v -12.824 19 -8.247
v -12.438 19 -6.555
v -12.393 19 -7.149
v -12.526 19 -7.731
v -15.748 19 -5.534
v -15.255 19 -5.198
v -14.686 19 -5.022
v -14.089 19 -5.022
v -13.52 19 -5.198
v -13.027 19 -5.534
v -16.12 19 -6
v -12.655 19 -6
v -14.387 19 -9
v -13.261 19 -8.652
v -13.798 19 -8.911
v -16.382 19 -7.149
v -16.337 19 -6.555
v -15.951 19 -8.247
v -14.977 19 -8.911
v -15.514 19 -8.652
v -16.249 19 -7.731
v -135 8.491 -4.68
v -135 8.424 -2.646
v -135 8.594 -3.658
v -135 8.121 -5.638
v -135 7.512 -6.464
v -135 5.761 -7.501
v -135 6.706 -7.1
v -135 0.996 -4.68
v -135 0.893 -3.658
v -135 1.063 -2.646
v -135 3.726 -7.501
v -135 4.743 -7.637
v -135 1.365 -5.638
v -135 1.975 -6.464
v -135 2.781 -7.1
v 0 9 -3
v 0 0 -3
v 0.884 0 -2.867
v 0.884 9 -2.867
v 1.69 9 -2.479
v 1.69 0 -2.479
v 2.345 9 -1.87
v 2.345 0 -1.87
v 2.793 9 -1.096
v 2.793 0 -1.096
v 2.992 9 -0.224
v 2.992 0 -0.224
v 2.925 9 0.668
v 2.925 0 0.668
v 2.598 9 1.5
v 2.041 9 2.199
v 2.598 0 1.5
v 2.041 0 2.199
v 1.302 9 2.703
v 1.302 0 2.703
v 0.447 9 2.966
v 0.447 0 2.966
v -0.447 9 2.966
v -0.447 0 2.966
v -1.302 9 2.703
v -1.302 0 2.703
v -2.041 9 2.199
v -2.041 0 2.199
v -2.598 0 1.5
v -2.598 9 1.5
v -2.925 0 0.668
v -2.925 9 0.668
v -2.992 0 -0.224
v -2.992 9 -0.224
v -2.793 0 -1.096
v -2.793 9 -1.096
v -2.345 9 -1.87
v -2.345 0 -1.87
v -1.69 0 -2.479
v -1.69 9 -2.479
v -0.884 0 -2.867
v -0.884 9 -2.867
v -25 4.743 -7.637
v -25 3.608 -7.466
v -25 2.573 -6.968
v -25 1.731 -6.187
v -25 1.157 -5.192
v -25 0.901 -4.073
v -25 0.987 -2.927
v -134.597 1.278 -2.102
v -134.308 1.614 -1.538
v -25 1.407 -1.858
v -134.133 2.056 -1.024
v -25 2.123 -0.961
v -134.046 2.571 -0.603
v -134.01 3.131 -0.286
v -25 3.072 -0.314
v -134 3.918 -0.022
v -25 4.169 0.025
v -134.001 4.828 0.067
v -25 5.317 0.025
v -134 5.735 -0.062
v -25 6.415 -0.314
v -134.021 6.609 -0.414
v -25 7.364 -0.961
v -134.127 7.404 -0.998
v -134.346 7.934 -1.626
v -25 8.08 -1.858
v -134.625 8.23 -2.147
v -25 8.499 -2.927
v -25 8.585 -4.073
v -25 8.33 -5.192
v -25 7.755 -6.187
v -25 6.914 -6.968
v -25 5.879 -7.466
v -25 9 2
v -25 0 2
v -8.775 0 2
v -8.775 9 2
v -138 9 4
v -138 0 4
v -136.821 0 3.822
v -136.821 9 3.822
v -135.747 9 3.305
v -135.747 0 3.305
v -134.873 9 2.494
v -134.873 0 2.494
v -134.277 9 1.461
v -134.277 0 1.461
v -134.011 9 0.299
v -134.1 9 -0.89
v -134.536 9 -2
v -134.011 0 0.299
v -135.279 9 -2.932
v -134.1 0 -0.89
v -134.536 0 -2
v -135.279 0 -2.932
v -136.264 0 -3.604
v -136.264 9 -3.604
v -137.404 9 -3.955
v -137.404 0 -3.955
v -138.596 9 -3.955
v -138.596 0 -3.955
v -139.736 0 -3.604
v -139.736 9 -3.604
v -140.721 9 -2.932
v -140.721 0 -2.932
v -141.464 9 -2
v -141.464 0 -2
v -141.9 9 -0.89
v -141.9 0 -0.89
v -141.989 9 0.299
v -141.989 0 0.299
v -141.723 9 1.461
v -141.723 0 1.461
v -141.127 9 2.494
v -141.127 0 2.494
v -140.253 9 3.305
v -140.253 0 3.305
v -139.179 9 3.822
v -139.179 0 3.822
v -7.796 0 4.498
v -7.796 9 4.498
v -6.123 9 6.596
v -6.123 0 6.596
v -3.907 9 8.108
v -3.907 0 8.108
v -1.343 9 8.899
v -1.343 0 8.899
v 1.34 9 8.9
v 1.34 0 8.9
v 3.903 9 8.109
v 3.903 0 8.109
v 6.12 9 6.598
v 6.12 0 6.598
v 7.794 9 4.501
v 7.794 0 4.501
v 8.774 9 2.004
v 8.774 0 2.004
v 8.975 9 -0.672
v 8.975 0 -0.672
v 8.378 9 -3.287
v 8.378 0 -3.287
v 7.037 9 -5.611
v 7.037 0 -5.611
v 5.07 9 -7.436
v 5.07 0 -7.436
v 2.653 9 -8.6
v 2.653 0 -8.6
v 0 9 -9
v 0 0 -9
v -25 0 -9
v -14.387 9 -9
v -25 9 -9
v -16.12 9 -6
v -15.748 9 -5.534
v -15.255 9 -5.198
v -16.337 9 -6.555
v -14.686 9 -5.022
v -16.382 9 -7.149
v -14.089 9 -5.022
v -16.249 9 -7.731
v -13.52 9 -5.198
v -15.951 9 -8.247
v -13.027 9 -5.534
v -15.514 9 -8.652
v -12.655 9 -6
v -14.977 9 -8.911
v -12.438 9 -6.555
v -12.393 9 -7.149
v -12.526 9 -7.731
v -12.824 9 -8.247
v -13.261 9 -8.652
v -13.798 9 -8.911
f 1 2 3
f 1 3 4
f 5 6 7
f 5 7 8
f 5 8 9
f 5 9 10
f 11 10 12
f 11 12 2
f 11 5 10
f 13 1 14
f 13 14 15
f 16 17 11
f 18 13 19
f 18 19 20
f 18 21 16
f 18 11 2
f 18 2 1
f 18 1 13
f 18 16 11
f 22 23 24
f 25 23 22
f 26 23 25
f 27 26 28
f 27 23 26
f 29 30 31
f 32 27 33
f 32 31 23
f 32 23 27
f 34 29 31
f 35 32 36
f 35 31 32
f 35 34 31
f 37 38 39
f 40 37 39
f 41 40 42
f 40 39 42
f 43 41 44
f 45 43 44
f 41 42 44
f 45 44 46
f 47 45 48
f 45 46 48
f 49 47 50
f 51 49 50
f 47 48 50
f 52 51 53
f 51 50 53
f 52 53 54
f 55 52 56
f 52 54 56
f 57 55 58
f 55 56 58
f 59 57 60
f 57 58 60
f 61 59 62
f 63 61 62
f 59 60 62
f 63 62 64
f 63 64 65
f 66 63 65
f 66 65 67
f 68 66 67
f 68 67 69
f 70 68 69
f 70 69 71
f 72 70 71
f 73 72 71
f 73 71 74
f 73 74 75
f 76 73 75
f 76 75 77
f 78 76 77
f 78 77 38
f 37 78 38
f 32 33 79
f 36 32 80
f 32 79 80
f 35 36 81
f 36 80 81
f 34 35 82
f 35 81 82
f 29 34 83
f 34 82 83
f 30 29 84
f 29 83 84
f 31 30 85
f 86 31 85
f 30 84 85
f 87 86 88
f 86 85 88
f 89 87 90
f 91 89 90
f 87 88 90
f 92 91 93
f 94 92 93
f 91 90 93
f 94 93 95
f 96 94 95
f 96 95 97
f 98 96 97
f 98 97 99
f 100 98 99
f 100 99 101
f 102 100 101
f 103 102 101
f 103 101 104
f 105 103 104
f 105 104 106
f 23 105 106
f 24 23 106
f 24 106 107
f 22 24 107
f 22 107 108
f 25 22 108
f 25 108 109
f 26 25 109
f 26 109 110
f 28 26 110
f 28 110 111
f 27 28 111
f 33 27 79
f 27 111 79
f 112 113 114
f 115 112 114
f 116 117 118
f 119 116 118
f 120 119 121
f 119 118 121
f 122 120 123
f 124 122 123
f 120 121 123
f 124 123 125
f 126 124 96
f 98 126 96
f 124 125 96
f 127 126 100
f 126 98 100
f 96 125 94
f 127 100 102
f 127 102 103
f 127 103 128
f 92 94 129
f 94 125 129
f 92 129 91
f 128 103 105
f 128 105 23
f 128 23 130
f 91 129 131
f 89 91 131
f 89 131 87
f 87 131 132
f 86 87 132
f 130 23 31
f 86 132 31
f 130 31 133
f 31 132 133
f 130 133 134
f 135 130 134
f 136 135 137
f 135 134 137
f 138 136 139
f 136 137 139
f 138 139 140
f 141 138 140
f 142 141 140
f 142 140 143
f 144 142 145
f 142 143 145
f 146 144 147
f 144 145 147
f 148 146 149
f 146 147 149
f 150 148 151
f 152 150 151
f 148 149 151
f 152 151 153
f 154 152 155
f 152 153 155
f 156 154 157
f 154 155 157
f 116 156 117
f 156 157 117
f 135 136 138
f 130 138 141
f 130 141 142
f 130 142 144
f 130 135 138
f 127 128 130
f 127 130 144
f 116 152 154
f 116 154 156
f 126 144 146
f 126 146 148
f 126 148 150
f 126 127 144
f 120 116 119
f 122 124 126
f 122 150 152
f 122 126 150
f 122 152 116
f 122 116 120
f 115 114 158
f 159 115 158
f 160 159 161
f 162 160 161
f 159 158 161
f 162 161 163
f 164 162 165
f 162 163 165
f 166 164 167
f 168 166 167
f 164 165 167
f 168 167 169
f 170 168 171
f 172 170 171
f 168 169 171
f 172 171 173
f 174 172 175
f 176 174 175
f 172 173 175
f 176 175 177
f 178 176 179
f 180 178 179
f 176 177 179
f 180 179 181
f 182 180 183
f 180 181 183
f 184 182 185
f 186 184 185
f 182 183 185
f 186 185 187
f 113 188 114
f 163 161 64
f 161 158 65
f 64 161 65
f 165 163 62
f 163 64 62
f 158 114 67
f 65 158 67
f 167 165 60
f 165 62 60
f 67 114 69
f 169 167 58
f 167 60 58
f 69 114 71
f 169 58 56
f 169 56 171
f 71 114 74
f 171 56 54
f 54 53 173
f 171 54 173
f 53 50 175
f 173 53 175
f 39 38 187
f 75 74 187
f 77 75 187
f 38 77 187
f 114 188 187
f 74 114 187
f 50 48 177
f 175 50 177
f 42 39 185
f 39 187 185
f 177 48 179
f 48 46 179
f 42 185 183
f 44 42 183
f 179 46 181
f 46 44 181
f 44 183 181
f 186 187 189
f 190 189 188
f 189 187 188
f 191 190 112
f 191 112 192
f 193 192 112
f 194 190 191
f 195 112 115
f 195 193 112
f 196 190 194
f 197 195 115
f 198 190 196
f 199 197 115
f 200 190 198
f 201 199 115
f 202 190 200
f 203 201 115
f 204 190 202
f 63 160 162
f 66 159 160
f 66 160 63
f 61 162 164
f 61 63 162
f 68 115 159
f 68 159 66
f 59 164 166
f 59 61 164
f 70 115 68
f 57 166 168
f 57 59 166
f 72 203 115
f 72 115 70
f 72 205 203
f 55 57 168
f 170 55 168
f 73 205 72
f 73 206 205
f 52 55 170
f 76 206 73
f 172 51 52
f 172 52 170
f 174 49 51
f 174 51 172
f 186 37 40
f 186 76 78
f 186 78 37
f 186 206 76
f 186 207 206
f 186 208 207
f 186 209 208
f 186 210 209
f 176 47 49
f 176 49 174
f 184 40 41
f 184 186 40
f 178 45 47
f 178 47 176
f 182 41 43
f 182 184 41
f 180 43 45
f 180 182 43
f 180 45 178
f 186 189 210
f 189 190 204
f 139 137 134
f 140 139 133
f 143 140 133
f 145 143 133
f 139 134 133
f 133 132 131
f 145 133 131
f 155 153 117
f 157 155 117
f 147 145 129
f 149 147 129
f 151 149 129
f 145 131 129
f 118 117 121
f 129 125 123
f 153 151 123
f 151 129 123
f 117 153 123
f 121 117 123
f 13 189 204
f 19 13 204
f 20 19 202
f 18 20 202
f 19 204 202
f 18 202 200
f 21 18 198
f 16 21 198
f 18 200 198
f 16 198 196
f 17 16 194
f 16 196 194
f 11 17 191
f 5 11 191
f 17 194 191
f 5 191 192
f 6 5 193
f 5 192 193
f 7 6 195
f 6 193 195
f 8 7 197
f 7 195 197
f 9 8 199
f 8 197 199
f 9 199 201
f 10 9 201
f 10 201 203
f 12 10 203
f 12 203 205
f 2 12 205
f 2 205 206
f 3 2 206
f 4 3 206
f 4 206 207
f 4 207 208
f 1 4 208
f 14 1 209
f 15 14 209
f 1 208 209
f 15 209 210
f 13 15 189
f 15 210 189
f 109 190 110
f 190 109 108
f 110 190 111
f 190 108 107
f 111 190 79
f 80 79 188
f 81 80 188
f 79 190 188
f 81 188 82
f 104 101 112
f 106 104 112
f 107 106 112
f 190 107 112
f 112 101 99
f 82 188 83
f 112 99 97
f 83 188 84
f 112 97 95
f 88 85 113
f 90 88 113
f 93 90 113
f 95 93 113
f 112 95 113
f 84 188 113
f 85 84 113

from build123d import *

# Parameters (mm, degrees)
SKETCH1_R           = 9
BOSS_EXTRUDE1_DEPTH = 9
SKETCH2_R           = 3
CUT_EXTRUDE1_DEPTH  = 29.053520278
SKETCH3_R           = 4
BOSS_EXTRUDE2_DEPTH = 9
SKETCH4_R           = 3.852623496
BOSS_EXTRUDE3_DEPTH = 110
SKETCH5_R           = 2
BOSS_EXTRUDE4_DEPTH = 10


with BuildPart() as part:
    # Sketch1 → Boss-Extrude1 (new body)
    with BuildSketch(Plane(origin=(0, 0, 0), x_dir=(1, 0, 0), z_dir=(0, 1, 0))):
        with BuildLine():
            ThreePointArc((-8.774964387, -2), (-7.03562364, 5.61248608), (0, 9))
            Line((0, 9), (-25, 9))
            Line((-25, 9), (-25, -2))
            Line((-25, -2), (-8.774964387, -2))
        make_face()
        Circle(SKETCH1_R)
    extrude(amount=BOSS_EXTRUDE1_DEPTH)

    # Sketch2 → Cut-Extrude1 (cut, through all)
    with BuildSketch(Plane.XZ):
        with Locations(Location((0, 0, 0), (0, 0, 270))):
            Circle(SKETCH2_R)
    extrude(amount=-CUT_EXTRUDE1_DEPTH, mode=Mode.SUBTRACT)



with BuildPart() as body_2:
    # Sketch3 → Boss-Extrude2 (new body)
    with BuildSketch(Plane(origin=(0, 0, 0), x_dir=(1, 0, 0), z_dir=(0, 1, 0))):
        with Locations(Location((-138, 0, 0), (0, 0, 270))):
            Circle(SKETCH3_R)
    extrude(amount=BOSS_EXTRUDE2_DEPTH)


with BuildPart() as part_1:
    add(part.part)

    add(body_2.part)  # Boss-Extrude3 merges body 2
    # Sketch4 → Boss-Extrude3 (add)
    with BuildSketch(Plane.ZY.offset(25)):
        with Locations(Location((-3.784788574, 4.743284234, 0), (0, 0, 180))):
            Circle(SKETCH4_R)
    extrude(amount=BOSS_EXTRUDE3_DEPTH)

    # Sketch5 → Boss-Extrude4 (add)
    with BuildSketch(Plane(origin=(0, 9, 0), x_dir=(1, 0, 0), z_dir=(0, 1, 0))):
        with Locations(Location((-14.38749457, 7, 0), (0, 0, 90))):
            Circle(SKETCH5_R)
    extrude(amount=BOSS_EXTRUDE4_DEPTH)


solid = part_1.part
